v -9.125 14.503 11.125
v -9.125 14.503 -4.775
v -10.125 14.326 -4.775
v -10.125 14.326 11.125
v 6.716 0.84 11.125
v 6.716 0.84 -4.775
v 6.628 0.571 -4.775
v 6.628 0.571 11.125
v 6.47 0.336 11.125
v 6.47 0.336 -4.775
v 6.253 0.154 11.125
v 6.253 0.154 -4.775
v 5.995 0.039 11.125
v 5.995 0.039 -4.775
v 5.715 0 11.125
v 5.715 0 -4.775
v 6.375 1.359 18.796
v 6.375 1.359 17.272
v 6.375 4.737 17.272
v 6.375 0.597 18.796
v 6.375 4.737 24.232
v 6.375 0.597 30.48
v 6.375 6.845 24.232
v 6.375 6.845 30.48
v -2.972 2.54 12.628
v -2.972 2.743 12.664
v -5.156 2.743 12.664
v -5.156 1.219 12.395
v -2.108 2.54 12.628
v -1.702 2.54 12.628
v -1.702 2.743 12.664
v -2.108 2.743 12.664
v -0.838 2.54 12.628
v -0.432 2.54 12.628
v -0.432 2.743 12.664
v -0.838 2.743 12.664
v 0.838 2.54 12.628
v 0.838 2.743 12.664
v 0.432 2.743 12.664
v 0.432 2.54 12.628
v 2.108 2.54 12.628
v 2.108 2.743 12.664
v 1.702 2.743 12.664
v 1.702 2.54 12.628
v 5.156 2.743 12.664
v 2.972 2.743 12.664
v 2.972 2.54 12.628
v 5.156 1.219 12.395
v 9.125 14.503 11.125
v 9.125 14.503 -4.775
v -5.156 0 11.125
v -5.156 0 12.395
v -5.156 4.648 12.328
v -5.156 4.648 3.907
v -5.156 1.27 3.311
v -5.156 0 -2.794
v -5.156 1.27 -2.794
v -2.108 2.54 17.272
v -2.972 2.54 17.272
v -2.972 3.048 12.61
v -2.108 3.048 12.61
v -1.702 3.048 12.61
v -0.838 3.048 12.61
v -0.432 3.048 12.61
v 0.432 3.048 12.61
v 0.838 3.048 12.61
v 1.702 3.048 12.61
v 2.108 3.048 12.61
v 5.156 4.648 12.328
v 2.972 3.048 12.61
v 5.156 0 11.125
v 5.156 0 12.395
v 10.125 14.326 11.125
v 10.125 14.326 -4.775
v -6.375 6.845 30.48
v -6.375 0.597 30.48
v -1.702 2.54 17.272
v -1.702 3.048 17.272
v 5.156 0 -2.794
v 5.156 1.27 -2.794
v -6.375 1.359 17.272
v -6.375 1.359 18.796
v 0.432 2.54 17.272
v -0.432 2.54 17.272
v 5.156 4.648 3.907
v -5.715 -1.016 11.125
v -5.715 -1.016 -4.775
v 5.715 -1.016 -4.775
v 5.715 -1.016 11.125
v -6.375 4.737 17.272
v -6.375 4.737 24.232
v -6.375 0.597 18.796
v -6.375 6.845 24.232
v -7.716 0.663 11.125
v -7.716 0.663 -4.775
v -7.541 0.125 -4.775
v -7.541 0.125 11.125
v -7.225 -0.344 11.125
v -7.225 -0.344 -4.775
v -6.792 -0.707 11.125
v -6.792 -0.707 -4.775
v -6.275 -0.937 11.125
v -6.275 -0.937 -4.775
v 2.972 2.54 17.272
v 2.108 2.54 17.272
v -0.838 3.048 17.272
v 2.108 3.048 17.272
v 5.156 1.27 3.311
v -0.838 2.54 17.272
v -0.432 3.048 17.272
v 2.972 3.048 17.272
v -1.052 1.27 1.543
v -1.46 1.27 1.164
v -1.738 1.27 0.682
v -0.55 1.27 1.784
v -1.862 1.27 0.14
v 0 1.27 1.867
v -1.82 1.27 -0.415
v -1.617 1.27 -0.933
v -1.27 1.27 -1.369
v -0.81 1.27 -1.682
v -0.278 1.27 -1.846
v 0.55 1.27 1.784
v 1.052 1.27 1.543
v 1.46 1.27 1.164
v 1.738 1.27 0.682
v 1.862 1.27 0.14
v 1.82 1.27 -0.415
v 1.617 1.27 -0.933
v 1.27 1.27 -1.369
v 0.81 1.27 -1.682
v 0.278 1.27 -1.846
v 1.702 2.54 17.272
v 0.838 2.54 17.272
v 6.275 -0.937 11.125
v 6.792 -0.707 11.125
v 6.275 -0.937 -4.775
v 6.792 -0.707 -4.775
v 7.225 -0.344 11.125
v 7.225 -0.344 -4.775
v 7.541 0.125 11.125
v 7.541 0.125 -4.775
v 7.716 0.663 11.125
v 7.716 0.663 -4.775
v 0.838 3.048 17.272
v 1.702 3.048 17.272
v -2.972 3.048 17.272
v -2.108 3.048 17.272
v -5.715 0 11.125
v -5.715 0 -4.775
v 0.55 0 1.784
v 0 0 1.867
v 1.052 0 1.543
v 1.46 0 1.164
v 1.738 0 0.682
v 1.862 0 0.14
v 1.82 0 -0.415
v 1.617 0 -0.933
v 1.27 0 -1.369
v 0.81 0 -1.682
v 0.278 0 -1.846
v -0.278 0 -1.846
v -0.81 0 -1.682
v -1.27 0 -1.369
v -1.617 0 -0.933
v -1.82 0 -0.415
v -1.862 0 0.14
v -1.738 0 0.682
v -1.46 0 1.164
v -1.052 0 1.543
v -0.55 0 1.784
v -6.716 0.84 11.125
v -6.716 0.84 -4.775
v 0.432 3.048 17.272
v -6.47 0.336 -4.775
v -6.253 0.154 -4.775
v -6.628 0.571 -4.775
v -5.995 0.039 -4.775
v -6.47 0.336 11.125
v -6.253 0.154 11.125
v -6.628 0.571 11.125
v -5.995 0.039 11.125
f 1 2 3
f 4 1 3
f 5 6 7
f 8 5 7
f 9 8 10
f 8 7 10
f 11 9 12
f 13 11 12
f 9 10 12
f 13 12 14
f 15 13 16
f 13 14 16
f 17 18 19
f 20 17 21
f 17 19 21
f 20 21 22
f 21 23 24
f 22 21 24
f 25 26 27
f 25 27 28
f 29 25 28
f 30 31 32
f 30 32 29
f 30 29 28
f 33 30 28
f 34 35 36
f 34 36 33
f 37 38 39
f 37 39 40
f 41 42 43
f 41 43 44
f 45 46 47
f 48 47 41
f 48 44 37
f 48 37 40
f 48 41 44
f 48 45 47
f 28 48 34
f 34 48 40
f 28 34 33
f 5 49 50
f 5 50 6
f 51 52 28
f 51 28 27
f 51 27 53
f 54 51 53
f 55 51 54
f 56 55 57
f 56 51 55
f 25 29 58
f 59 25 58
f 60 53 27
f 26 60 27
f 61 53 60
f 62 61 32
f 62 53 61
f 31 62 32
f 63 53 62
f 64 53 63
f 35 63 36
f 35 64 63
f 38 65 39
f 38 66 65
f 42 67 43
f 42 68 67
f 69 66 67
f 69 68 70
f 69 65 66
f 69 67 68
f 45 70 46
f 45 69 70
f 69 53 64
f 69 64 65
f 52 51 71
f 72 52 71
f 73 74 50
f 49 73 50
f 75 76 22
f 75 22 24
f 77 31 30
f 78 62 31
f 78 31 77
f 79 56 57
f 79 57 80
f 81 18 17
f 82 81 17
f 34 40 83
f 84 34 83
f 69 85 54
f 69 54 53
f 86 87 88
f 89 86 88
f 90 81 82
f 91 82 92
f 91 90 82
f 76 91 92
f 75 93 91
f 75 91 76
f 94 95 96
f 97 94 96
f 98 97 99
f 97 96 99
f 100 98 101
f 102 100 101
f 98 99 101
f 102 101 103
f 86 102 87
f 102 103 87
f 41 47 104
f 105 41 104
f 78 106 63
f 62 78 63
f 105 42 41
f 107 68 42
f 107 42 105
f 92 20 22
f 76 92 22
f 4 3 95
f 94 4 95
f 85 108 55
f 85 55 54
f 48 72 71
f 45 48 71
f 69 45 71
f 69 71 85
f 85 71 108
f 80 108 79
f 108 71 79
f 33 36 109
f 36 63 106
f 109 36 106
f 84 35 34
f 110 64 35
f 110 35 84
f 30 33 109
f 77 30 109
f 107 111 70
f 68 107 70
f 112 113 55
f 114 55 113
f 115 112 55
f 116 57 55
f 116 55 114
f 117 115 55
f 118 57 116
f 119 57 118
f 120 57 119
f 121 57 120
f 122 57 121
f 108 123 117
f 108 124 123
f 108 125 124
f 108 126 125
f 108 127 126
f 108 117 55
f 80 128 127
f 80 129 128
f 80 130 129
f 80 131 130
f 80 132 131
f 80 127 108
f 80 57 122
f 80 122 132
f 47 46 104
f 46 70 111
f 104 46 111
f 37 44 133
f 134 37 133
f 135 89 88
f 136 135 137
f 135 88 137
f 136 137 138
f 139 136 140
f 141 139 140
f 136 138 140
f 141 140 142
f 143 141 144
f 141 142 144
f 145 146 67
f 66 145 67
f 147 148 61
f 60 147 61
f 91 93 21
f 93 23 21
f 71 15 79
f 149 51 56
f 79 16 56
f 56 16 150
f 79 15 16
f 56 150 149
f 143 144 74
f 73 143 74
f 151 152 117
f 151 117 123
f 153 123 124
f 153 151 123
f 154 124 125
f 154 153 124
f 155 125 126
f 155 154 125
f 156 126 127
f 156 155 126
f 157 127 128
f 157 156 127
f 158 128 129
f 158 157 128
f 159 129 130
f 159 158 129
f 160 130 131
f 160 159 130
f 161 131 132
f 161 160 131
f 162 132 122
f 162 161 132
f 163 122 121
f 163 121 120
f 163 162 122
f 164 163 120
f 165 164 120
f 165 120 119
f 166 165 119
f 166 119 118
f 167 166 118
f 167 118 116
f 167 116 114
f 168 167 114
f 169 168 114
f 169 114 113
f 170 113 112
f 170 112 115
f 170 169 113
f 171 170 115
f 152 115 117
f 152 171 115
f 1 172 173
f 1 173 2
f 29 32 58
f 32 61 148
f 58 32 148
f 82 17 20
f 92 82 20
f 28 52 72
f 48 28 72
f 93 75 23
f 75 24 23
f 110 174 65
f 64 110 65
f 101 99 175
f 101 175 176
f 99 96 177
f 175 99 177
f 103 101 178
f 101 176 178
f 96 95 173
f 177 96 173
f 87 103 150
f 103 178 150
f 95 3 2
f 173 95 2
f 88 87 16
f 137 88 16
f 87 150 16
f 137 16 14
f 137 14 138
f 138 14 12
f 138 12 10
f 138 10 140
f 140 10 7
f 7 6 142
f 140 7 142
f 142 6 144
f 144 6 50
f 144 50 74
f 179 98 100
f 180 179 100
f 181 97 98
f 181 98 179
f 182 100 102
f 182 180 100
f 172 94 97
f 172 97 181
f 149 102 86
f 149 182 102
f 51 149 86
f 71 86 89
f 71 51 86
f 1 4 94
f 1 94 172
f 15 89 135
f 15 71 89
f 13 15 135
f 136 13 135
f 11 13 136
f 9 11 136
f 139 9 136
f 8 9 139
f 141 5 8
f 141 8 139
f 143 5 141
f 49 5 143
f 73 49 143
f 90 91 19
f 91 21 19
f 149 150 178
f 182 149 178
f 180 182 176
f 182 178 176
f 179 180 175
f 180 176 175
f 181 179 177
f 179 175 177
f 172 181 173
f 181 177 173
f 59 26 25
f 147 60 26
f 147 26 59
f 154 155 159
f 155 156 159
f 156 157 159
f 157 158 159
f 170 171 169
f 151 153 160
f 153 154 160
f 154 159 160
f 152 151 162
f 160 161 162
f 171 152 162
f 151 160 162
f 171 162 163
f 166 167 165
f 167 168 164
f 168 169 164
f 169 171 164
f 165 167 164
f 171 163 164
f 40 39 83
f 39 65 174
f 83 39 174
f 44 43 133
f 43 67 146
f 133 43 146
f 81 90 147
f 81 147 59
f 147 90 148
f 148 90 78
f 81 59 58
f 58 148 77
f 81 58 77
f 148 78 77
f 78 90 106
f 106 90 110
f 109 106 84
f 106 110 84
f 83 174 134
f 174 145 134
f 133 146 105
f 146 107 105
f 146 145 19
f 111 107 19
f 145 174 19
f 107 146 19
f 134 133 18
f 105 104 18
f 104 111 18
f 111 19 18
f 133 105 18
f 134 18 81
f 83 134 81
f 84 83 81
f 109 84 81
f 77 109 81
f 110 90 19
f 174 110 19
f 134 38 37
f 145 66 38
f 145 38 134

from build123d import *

# Parameters (mm, degrees)
SKETCH1_W                       = 10.3124
SKETCH1_H                       = 15.1892
SKETCH1_R                       = 1.8669
BOSS_EXTRUDE1_DEPTH             = 1.27
BOSS_EXTRUDE2_REACH             = 15.485
BOSS_EXTRUDE2_DIRECTION_2_REACH = 15.485
BOSS_EXTRUDE3_DEPTH             = 0.4318
LPATTERN1_COUNT                 = 5
LPATTERN1_PITCH                 = 1.27
BOSS_EXTRUDE4_DEPTH             = 6.3754
BOSS_EXTRUDE5_DEPTH             = 11.1252
BOSS_EXTRUDE5_DEPTH_BACK        = 4.7752


with BuildPart() as part:
    # Sketch1 → Boss-Extrude1 (new body)
    with BuildSketch(Plane(origin=(0, 0, 0), x_dir=(1, 0, 0), z_dir=(0, 1, 0))):
        with Locations((0, -4.8006)):
            Rectangle(SKETCH1_W, SKETCH1_H)
        with Locations(Location((0, 0, 0), (0, 0, 270))):
            Circle(SKETCH1_R, mode=Mode.SUBTRACT)
    extrude(amount=BOSS_EXTRUDE1_DEPTH)

    # Boss-Extrude2: up to this face of the body (flat: up to its plane)
    boss_extrude2_end = Plane(part.part.faces().sort_by_distance((5.1562, 0.635, 4.8006))[0])
    # Sketch2 → Boss-Extrude2 (add, up to the picked face)
    with BuildSketch(Plane(origin=(0, 0, 0), x_dir=(0, 0, -1), z_dir=(1, 0, 0)), mode=Mode.PRIVATE) as boss_extrude2_sk1:
        Polygon((-3.302, 1.2192), (-3.906625217, 4.6482), (-12.32801942, 4.6482), (-12.663922319, 2.7432), (-12.3952, 1.2192), align=None)
    boss_extrude2_tool1 = split(extrude(boss_extrude2_sk1.sketch, amount=BOSS_EXTRUDE2_REACH, mode=Mode.PRIVATE), bisect_by=boss_extrude2_end, keep=Keep.BOTH, mode=Mode.PRIVATE)
    add(boss_extrude2_tool1.solids().sort_by(Axis((0, 2.911082, 8.056355), (1, 0, 0)))[0])

    # Boss-Extrude2 direction 2: up to this face of the body (flat: up to its plane)
    boss_extrude2_direction_2_end = Plane(part.part.faces().sort_by_distance((-5.1562, 0.635, 4.8006))[0])
    # Sketch2 → Boss-Extrude2 direction 2 (add, up to the picked face)
    with BuildSketch(Plane(origin=(0, 0, 0), x_dir=(0, 0, -1), z_dir=(1, 0, 0)), mode=Mode.PRIVATE) as boss_extrude2_direction_2_sk1:
        Polygon((-3.302, 1.2192), (-3.906625217, 4.6482), (-12.32801942, 4.6482), (-12.663922319, 2.7432), (-12.3952, 1.2192), align=None)
    boss_extrude2_direction_2_tool1 = split(extrude(boss_extrude2_direction_2_sk1.sketch, amount=-BOSS_EXTRUDE2_DIRECTION_2_REACH, mode=Mode.PRIVATE), bisect_by=boss_extrude2_direction_2_end, keep=Keep.BOTH, mode=Mode.PRIVATE)
    add(boss_extrude2_direction_2_tool1.solids().sort_by(Axis((0, 2.911082, 8.056355), (-1, 0, 0)))[0])

    # Sketch3 → Boss-Extrude3 (add, symmetric)
    with BuildSketch(Plane(origin=(2.54, 0, 0), x_dir=(0, 0, -1), z_dir=(1, 0, 0))):
        with BuildLine():
            Line((-11.1252, 2.54), (-18.7452, 2.54))
            ThreePointArc((-18.7452, 2.54), (-18.762931645, 2.540154742), (-18.780657889, 2.54061892))
            Line((-18.780657889, 2.54061892), (-25.050636059, 2.759571382))
            Line((-25.050636059, 2.759571382), (-25.032907115, 3.267261922))
            Line((-25.032907115, 3.267261922), (-18.762928944, 3.04830946))
            ThreePointArc((-18.762928944, 3.04830946), (-18.754065822, 3.048077371), (-18.7452, 3.048))
            Line((-18.7452, 3.048), (-11.1252, 3.048))
            Line((-11.1252, 3.048), (-11.1252, 2.54))
        make_face()
    boss_extrude3 = extrude(amount=BOSS_EXTRUDE3_DEPTH, both=True)

    # LPattern1: Boss-Extrude3 ×5
    with Locations(*[(-i * LPATTERN1_PITCH, 0, 0) for i in range(1, LPATTERN1_COUNT)]):
        add(boss_extrude3)

    # Sketch4 → Boss-Extrude4 (add, symmetric)
    with BuildSketch(Plane(origin=(0, 0, 0), x_dir=(0, 0, -1), z_dir=(1, 0, 0))):
        Polygon((-18.796, 0.5969), (-30.48, 0.5969), (-30.48, 6.8453), (-24.2316, 6.8453), (-24.2316, 4.7371), (-17.272, 4.7371), (-17.272, 1.3589), (-18.796, 1.3589), align=None)
    extrude(amount=BOSS_EXTRUDE4_DEPTH, both=True)

    # Sketch5 → Boss-Extrude5 (add, two sides: drawn at the far end of the back side and taken through both)
    with BuildSketch(Plane.XY.offset(-BOSS_EXTRUDE5_DEPTH_BACK)):
        with BuildLine():
            Line((5.715, 0), (-5.715, 0))
            ThreePointArc((-5.715, 0), (-6.368072211, 0.237698846), (-6.715564677, 0.839573451))
            Line((-6.715564677, 0.839573451), (-9.124737032, 14.502668828))
            Line((-9.124737032, 14.502668828), (-10.125301709, 14.326242279))
            Line((-10.125301709, 14.326242279), (-7.716129354, 0.663146903))
            ThreePointArc((-7.716129354, 0.663146903), (-7.021144423, -0.540602308), (-5.715, -1.016))
            Line((-5.715, -1.016), (5.715, -1.016))
            ThreePointArc((5.715, -1.016), (7.021144423, -0.540602308), (7.716129354, 0.663146903))
            Line((7.716129354, 0.663146903), (10.125301709, 14.326242279))
            Line((10.125301709, 14.326242279), (9.124737032, 14.502668828))
            Line((9.124737032, 14.502668828), (6.715564677, 0.839573451))
            ThreePointArc((6.715564677, 0.839573451), (6.368072211, 0.237698846), (5.715, 0))
        make_face()
    extrude(amount=BOSS_EXTRUDE5_DEPTH + BOSS_EXTRUDE5_DEPTH_BACK)


solid = part.part
